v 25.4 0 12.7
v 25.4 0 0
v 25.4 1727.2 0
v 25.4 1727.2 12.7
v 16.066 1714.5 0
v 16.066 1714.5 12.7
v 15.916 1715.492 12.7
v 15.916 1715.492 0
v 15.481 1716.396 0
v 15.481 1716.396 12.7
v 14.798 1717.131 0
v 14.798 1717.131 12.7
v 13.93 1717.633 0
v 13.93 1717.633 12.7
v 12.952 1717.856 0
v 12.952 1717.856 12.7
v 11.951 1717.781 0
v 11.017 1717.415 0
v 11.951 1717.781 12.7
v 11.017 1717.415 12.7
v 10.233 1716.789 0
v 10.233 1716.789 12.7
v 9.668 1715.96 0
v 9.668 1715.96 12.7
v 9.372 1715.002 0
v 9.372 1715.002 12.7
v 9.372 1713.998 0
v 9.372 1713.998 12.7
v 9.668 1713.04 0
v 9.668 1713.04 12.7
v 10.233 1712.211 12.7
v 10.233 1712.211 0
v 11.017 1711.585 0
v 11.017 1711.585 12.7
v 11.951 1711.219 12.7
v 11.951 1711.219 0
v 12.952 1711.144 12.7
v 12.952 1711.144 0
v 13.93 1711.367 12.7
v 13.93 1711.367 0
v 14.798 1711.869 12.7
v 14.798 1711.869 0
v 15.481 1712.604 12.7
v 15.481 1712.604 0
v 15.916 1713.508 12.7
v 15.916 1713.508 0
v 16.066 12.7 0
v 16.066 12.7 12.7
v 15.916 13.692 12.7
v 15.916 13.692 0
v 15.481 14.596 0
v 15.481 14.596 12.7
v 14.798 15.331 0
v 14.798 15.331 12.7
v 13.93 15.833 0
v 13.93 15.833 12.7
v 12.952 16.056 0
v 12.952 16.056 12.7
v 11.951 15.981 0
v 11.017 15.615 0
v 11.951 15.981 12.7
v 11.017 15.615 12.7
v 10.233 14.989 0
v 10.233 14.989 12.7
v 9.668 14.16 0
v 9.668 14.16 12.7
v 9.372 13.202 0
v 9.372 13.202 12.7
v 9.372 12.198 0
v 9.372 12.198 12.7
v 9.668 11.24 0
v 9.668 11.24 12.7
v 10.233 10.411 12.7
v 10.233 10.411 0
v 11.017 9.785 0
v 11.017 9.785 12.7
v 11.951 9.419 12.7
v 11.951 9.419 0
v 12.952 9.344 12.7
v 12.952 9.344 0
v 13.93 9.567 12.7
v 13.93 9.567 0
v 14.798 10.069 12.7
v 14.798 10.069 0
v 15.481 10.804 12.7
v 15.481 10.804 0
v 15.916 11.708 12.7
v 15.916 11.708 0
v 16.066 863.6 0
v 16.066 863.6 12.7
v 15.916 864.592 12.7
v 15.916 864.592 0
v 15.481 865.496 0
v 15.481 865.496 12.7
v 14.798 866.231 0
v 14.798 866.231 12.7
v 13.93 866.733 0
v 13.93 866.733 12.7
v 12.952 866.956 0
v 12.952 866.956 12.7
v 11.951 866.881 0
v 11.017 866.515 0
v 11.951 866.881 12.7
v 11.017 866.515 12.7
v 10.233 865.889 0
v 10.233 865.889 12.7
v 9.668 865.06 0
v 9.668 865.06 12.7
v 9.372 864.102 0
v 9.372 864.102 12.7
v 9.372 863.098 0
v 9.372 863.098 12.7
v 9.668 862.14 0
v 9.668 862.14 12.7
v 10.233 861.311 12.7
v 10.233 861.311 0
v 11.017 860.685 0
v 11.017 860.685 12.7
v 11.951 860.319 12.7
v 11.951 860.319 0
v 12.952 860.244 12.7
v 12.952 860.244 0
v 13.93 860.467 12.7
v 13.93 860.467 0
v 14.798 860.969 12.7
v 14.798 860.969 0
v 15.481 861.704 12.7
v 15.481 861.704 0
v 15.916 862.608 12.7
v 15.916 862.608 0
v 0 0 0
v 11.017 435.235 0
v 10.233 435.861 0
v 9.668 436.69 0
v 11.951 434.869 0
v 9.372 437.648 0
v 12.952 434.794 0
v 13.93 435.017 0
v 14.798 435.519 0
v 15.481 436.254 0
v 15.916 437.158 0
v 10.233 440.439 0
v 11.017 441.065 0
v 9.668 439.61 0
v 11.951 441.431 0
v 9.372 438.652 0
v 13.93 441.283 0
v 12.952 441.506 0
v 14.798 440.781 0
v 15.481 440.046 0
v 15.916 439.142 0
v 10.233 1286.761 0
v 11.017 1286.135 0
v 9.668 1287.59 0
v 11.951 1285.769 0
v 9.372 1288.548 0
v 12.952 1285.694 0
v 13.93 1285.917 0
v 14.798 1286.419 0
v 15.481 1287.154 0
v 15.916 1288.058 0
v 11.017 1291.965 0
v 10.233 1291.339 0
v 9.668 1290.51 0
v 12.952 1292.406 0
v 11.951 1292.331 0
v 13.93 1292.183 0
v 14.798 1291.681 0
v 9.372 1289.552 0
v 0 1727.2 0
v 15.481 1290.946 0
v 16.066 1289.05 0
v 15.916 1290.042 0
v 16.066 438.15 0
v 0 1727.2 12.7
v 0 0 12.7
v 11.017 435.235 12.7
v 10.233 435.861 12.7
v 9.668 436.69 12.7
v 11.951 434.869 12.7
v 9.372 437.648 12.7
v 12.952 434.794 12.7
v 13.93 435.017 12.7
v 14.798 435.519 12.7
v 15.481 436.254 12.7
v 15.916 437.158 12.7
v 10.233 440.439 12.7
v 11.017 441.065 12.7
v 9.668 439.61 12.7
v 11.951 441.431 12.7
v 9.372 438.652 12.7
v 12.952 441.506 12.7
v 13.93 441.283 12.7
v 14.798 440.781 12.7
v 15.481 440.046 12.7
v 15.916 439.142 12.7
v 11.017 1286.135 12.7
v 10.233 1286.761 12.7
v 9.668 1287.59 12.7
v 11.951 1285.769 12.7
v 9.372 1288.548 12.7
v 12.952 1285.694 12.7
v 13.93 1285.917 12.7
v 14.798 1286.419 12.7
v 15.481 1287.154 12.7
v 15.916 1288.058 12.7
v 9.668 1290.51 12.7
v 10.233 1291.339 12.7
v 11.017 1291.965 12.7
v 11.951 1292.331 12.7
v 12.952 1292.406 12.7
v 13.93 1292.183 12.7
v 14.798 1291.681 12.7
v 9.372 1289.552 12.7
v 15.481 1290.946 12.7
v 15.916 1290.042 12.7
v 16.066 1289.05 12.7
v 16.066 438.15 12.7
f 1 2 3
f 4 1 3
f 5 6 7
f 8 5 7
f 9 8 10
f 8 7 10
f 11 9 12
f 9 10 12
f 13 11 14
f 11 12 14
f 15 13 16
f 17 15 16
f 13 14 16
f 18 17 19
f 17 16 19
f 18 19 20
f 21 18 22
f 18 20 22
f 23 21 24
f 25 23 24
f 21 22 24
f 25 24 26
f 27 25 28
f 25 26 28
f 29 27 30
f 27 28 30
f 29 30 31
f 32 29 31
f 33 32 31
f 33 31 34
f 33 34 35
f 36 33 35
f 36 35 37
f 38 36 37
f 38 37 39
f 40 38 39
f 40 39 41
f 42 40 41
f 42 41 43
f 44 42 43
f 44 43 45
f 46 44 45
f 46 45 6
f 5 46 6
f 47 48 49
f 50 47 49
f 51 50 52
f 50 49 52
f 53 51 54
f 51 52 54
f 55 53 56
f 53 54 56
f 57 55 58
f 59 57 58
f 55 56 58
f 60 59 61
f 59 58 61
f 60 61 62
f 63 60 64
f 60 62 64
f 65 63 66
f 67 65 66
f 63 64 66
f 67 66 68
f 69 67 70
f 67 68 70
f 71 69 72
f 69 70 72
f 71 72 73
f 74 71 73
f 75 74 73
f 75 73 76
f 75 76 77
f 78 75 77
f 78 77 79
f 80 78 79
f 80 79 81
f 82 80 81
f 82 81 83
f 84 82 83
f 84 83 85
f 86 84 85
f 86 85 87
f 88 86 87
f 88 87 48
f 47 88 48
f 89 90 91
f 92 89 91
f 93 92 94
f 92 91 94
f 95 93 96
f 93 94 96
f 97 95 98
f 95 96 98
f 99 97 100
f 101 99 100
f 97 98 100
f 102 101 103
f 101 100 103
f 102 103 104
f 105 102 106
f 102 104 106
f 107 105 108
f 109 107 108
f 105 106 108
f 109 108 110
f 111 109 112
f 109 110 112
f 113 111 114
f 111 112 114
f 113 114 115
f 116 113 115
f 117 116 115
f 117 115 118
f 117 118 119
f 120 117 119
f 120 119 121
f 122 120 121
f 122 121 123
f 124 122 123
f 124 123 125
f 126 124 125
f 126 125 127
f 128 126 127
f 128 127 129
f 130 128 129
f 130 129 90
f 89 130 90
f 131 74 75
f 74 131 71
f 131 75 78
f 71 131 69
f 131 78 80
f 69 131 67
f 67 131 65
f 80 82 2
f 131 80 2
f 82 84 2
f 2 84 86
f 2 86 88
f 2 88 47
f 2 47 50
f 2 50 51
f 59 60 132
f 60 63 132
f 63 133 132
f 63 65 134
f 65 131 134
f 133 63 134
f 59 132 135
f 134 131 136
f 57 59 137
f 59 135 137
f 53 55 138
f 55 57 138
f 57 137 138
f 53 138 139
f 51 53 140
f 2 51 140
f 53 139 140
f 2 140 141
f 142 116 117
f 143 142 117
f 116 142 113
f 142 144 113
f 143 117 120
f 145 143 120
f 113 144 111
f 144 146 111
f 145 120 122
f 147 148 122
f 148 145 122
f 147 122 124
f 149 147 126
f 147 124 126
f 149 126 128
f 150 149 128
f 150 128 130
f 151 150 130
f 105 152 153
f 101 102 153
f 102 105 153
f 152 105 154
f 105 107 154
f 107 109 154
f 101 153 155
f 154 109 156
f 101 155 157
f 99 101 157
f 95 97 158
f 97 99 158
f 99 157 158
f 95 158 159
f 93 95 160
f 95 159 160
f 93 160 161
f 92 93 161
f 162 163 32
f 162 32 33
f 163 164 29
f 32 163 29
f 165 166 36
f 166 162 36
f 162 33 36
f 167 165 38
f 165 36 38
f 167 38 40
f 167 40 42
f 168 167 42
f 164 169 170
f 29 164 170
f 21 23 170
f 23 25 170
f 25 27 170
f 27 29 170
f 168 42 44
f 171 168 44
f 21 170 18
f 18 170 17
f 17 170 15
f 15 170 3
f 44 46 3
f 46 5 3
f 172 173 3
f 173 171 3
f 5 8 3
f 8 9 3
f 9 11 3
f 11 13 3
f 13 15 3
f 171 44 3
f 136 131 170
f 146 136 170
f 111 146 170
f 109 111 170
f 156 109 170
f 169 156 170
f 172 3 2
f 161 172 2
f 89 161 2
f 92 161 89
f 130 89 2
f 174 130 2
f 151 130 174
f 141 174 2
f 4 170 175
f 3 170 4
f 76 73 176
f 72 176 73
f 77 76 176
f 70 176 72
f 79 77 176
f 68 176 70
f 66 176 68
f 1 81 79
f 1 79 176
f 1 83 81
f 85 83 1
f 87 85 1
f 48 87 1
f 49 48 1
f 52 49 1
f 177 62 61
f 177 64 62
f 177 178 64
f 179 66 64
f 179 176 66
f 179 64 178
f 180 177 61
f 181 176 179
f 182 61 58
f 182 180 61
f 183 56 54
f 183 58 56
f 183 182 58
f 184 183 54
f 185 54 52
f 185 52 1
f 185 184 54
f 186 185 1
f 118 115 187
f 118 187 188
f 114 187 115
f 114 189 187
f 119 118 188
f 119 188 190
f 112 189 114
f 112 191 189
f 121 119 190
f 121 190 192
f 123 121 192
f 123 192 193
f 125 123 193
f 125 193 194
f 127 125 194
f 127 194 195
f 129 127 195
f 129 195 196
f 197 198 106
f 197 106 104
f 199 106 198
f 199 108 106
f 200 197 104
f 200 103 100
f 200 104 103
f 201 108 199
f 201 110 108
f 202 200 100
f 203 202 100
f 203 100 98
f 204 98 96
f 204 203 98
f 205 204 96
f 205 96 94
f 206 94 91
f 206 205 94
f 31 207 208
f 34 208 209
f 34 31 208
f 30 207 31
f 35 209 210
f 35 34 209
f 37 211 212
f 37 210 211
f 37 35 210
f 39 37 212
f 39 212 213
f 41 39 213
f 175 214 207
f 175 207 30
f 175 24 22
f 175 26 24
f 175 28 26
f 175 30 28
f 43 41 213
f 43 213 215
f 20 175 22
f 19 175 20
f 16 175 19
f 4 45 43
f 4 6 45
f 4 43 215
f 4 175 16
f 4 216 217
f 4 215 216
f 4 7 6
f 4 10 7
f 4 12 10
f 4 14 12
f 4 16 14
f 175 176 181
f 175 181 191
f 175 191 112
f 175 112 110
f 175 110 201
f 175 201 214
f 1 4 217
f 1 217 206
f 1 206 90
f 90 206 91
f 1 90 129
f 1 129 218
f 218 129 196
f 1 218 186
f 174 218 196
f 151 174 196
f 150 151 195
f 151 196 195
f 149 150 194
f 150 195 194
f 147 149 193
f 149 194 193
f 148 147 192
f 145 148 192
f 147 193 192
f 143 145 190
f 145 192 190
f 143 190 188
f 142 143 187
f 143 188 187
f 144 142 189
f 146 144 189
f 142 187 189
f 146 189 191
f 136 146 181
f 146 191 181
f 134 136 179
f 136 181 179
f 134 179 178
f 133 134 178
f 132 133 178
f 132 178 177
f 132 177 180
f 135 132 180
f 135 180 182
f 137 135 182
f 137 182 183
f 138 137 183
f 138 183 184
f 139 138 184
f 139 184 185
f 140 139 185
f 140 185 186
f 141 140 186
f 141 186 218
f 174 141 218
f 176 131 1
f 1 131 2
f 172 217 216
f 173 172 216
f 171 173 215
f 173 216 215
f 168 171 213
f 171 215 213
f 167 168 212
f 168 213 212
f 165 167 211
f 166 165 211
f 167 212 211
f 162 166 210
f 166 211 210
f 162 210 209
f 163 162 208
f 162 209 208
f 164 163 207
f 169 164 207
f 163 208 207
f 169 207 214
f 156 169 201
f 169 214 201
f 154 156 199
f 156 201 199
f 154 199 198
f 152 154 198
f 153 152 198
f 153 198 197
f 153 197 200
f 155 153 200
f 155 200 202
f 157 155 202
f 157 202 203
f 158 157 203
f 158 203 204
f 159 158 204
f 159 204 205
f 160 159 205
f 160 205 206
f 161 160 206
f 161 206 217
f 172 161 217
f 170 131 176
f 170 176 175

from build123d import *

# Parameters (mm, degrees)
SKETCH1_W           = 25.4
SKETCH1_H           = 1727.2
BOSS_EXTRUDE1_DEPTH = 12.7
SKETCH2_R           = 3.3655
CUT_EXTRUDE1_DEPTH  = 13.7
LPATTERN1_COUNT     = 5
LPATTERN1_PITCH     = 425.45


with BuildPart() as part:
    # Sketch1 → Boss-Extrude1 (new body)
    with BuildSketch(Plane.XY):
        with Locations((12.7, 863.6)):
            Rectangle(SKETCH1_W, SKETCH1_H)
    extrude(amount=BOSS_EXTRUDE1_DEPTH)

    # Sketch2 → Cut-Extrude1 (cut, through all)
    with BuildSketch(Plane.XY.offset(12.7)):
        with Locations((12.7, 12.7)):
            Circle(SKETCH2_R)
    cut_extrude1 = extrude(amount=-CUT_EXTRUDE1_DEPTH, mode=Mode.SUBTRACT)

    # LPattern1: Cut-Extrude1 ×5
    with Locations(*[(0, i * LPATTERN1_PITCH, 0) for i in range(1, LPATTERN1_COUNT)]):
        add(cut_extrude1, mode=Mode.SUBTRACT)


solid = part.part
